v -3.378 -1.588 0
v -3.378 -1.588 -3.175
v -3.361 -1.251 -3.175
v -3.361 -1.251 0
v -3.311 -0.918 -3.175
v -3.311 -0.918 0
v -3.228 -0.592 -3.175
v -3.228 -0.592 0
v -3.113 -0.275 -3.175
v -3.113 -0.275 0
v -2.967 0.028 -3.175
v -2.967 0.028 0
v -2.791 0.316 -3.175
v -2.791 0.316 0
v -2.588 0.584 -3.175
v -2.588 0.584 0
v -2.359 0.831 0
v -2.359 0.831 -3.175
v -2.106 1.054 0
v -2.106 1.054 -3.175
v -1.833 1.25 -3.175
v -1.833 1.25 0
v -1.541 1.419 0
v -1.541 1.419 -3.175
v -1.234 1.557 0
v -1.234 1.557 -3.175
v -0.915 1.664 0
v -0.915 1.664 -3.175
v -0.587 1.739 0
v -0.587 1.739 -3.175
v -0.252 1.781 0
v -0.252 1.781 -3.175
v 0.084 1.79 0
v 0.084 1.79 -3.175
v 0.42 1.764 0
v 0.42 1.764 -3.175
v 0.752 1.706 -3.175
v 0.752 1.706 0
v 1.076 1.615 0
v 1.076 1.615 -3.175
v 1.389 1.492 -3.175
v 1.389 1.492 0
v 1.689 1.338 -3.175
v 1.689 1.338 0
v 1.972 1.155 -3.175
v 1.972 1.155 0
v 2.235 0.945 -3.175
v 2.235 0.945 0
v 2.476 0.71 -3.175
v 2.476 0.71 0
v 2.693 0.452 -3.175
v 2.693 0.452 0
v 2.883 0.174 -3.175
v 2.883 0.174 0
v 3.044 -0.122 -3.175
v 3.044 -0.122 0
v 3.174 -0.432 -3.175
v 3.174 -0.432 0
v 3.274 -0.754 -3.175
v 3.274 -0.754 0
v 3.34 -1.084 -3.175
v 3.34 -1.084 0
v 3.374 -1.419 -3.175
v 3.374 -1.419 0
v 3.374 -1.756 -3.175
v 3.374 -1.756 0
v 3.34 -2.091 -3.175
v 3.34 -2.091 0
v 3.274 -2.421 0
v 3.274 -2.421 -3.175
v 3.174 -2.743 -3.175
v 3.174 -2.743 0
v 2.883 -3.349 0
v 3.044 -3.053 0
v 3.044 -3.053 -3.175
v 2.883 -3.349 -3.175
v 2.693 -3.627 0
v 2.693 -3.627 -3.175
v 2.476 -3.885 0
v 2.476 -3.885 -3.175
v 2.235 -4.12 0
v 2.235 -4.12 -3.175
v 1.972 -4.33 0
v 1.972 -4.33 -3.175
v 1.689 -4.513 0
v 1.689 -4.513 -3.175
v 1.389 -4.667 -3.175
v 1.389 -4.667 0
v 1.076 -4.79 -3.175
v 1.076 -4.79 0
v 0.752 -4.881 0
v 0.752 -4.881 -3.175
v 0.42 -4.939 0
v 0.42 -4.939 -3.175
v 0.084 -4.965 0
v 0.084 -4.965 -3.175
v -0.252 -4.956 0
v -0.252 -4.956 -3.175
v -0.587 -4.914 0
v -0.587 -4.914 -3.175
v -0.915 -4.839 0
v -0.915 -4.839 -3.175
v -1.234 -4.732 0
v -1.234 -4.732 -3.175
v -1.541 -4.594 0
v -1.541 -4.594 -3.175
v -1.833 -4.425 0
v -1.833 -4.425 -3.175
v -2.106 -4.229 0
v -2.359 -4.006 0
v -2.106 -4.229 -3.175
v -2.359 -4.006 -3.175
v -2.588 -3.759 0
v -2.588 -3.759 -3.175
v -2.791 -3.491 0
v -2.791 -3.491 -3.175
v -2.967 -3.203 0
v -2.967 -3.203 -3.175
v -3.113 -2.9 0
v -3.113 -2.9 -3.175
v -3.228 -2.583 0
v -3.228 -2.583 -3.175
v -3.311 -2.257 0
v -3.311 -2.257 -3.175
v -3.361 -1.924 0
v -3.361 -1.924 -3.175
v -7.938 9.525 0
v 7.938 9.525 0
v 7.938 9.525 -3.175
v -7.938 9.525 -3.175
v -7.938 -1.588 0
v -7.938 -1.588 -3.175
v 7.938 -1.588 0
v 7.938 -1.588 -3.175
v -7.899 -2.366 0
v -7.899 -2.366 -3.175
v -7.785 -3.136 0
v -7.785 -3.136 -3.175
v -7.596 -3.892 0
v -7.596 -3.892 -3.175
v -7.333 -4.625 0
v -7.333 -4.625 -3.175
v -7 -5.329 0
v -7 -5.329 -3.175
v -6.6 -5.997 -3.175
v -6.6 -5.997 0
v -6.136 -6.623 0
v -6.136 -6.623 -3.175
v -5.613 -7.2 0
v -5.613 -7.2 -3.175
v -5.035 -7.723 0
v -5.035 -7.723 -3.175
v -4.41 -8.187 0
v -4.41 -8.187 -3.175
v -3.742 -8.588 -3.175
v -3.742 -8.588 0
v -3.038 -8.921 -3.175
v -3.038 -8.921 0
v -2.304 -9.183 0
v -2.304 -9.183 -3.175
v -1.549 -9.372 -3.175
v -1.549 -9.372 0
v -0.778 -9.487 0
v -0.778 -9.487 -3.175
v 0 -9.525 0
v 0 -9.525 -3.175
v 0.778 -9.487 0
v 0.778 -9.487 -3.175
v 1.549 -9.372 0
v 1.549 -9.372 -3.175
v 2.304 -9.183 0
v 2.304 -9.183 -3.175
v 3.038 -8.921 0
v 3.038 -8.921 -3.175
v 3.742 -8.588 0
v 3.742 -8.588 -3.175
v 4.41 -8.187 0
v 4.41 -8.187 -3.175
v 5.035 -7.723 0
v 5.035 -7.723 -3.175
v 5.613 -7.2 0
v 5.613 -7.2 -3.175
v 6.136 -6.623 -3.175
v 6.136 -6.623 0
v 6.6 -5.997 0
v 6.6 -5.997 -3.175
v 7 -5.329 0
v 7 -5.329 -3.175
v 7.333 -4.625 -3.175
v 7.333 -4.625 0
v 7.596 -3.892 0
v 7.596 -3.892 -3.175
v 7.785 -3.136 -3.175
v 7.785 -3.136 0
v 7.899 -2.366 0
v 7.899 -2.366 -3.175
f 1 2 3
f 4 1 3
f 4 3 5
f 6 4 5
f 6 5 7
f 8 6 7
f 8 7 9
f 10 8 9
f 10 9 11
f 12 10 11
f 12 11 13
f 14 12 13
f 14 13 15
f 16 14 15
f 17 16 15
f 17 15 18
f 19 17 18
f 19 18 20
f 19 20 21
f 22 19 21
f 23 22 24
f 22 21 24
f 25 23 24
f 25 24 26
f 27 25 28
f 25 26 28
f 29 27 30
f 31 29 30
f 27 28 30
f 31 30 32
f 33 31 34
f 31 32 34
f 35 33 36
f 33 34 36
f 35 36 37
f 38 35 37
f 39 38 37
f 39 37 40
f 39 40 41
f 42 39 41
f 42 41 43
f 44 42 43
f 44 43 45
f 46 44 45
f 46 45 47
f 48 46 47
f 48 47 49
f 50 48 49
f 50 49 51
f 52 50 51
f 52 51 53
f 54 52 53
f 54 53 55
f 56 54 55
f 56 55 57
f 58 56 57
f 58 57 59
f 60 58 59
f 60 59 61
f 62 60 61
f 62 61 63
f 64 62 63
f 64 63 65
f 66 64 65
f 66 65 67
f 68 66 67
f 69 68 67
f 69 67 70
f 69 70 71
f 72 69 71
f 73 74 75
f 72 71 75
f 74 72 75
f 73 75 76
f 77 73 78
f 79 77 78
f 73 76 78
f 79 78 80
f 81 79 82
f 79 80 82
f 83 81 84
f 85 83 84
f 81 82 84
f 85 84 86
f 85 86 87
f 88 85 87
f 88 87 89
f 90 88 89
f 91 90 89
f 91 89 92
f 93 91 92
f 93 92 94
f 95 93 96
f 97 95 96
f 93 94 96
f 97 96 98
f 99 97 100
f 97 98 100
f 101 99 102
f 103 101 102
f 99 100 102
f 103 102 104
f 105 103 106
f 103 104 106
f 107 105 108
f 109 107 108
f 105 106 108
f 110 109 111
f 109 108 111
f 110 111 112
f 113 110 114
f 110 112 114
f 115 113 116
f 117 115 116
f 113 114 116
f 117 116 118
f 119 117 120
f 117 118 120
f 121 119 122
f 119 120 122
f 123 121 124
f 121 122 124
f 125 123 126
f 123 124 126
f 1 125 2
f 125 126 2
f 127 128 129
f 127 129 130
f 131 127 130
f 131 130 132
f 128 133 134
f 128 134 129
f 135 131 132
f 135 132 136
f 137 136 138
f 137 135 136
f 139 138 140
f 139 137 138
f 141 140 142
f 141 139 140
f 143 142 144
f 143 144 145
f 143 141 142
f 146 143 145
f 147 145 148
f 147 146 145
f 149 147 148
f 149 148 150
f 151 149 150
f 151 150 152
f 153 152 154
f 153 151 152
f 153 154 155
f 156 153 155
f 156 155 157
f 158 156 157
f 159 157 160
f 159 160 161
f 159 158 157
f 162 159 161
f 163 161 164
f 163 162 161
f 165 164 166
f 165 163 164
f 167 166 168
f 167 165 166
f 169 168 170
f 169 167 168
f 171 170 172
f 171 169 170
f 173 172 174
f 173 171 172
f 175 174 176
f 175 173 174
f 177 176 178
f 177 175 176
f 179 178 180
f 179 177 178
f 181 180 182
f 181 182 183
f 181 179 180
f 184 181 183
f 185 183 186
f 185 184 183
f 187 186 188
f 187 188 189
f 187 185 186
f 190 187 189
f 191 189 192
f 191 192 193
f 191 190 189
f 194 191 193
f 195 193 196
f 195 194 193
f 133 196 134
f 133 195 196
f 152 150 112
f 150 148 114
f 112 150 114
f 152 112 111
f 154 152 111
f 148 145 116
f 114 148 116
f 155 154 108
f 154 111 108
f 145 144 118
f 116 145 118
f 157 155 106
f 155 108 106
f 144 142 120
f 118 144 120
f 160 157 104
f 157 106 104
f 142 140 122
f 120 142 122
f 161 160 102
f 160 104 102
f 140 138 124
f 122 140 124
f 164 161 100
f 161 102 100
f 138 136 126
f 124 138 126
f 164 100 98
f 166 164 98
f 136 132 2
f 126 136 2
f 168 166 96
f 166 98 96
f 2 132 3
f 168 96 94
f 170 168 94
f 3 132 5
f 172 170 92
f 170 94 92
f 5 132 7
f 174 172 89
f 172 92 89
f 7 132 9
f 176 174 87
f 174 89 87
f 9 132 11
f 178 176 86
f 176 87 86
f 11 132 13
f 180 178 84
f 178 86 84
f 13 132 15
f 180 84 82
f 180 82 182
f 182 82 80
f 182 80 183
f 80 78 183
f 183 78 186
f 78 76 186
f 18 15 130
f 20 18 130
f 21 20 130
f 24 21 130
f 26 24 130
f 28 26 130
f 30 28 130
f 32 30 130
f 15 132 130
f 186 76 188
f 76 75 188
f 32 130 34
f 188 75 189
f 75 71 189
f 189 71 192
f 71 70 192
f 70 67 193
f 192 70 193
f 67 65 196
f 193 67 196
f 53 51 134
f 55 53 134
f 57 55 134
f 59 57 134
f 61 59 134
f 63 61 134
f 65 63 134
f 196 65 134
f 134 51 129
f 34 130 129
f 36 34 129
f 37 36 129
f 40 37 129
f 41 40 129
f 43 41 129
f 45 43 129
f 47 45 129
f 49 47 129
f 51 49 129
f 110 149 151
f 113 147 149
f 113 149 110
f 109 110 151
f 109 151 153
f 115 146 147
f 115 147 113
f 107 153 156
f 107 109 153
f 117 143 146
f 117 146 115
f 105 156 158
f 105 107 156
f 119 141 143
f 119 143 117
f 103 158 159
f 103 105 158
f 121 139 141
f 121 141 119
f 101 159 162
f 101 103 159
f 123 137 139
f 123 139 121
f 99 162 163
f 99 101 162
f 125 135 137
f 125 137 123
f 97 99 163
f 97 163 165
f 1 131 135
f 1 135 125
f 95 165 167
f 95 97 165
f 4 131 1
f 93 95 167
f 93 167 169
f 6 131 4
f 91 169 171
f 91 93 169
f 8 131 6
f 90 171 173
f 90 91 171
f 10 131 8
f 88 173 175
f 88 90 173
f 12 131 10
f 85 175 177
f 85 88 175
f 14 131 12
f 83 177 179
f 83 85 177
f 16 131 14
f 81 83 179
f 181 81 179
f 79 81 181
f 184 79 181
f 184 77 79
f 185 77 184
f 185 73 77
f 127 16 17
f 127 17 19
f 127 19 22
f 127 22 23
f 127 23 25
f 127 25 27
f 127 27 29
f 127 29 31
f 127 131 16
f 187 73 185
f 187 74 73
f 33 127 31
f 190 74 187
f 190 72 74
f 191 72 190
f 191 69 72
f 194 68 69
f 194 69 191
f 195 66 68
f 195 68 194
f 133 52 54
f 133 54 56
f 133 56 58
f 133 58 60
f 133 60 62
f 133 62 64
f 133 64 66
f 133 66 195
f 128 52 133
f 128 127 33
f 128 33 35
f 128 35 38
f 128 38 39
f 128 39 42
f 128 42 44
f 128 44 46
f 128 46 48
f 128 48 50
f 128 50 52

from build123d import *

# Parameters (mm, degrees)
F0_R     = 3.571875
F1_DEPTH = 3.175
F2_D     = 6.7564


with BuildPart() as f1:
    # F0 (on Top) → F1 (new body)
    with BuildSketch(Plane.XY):
        with BuildLine():
            Line((7.9375, -1.5875), (7.9375, 9.525))
            Line((7.9375, 9.525), (-7.9375, 9.525))
            Line((-7.9375, 9.525), (-7.9375, -1.5875))
            ThreePointArc((-7.9375, -1.5875), (0, -9.525), (7.9375, -1.5875))
        make_face()
        with Locations((0, -1.5875)):
            Circle(F0_R, mode=Mode.SUBTRACT)
        with Locations((0, -1.5875)):
            Circle(F0_R)
    extrude(amount=-F1_DEPTH)

    # F2 (through all)
    with Locations(Plane.XY):
        with Locations((0, -1.5875)):
            Hole(F2_D / 2)


solid = f1.part
